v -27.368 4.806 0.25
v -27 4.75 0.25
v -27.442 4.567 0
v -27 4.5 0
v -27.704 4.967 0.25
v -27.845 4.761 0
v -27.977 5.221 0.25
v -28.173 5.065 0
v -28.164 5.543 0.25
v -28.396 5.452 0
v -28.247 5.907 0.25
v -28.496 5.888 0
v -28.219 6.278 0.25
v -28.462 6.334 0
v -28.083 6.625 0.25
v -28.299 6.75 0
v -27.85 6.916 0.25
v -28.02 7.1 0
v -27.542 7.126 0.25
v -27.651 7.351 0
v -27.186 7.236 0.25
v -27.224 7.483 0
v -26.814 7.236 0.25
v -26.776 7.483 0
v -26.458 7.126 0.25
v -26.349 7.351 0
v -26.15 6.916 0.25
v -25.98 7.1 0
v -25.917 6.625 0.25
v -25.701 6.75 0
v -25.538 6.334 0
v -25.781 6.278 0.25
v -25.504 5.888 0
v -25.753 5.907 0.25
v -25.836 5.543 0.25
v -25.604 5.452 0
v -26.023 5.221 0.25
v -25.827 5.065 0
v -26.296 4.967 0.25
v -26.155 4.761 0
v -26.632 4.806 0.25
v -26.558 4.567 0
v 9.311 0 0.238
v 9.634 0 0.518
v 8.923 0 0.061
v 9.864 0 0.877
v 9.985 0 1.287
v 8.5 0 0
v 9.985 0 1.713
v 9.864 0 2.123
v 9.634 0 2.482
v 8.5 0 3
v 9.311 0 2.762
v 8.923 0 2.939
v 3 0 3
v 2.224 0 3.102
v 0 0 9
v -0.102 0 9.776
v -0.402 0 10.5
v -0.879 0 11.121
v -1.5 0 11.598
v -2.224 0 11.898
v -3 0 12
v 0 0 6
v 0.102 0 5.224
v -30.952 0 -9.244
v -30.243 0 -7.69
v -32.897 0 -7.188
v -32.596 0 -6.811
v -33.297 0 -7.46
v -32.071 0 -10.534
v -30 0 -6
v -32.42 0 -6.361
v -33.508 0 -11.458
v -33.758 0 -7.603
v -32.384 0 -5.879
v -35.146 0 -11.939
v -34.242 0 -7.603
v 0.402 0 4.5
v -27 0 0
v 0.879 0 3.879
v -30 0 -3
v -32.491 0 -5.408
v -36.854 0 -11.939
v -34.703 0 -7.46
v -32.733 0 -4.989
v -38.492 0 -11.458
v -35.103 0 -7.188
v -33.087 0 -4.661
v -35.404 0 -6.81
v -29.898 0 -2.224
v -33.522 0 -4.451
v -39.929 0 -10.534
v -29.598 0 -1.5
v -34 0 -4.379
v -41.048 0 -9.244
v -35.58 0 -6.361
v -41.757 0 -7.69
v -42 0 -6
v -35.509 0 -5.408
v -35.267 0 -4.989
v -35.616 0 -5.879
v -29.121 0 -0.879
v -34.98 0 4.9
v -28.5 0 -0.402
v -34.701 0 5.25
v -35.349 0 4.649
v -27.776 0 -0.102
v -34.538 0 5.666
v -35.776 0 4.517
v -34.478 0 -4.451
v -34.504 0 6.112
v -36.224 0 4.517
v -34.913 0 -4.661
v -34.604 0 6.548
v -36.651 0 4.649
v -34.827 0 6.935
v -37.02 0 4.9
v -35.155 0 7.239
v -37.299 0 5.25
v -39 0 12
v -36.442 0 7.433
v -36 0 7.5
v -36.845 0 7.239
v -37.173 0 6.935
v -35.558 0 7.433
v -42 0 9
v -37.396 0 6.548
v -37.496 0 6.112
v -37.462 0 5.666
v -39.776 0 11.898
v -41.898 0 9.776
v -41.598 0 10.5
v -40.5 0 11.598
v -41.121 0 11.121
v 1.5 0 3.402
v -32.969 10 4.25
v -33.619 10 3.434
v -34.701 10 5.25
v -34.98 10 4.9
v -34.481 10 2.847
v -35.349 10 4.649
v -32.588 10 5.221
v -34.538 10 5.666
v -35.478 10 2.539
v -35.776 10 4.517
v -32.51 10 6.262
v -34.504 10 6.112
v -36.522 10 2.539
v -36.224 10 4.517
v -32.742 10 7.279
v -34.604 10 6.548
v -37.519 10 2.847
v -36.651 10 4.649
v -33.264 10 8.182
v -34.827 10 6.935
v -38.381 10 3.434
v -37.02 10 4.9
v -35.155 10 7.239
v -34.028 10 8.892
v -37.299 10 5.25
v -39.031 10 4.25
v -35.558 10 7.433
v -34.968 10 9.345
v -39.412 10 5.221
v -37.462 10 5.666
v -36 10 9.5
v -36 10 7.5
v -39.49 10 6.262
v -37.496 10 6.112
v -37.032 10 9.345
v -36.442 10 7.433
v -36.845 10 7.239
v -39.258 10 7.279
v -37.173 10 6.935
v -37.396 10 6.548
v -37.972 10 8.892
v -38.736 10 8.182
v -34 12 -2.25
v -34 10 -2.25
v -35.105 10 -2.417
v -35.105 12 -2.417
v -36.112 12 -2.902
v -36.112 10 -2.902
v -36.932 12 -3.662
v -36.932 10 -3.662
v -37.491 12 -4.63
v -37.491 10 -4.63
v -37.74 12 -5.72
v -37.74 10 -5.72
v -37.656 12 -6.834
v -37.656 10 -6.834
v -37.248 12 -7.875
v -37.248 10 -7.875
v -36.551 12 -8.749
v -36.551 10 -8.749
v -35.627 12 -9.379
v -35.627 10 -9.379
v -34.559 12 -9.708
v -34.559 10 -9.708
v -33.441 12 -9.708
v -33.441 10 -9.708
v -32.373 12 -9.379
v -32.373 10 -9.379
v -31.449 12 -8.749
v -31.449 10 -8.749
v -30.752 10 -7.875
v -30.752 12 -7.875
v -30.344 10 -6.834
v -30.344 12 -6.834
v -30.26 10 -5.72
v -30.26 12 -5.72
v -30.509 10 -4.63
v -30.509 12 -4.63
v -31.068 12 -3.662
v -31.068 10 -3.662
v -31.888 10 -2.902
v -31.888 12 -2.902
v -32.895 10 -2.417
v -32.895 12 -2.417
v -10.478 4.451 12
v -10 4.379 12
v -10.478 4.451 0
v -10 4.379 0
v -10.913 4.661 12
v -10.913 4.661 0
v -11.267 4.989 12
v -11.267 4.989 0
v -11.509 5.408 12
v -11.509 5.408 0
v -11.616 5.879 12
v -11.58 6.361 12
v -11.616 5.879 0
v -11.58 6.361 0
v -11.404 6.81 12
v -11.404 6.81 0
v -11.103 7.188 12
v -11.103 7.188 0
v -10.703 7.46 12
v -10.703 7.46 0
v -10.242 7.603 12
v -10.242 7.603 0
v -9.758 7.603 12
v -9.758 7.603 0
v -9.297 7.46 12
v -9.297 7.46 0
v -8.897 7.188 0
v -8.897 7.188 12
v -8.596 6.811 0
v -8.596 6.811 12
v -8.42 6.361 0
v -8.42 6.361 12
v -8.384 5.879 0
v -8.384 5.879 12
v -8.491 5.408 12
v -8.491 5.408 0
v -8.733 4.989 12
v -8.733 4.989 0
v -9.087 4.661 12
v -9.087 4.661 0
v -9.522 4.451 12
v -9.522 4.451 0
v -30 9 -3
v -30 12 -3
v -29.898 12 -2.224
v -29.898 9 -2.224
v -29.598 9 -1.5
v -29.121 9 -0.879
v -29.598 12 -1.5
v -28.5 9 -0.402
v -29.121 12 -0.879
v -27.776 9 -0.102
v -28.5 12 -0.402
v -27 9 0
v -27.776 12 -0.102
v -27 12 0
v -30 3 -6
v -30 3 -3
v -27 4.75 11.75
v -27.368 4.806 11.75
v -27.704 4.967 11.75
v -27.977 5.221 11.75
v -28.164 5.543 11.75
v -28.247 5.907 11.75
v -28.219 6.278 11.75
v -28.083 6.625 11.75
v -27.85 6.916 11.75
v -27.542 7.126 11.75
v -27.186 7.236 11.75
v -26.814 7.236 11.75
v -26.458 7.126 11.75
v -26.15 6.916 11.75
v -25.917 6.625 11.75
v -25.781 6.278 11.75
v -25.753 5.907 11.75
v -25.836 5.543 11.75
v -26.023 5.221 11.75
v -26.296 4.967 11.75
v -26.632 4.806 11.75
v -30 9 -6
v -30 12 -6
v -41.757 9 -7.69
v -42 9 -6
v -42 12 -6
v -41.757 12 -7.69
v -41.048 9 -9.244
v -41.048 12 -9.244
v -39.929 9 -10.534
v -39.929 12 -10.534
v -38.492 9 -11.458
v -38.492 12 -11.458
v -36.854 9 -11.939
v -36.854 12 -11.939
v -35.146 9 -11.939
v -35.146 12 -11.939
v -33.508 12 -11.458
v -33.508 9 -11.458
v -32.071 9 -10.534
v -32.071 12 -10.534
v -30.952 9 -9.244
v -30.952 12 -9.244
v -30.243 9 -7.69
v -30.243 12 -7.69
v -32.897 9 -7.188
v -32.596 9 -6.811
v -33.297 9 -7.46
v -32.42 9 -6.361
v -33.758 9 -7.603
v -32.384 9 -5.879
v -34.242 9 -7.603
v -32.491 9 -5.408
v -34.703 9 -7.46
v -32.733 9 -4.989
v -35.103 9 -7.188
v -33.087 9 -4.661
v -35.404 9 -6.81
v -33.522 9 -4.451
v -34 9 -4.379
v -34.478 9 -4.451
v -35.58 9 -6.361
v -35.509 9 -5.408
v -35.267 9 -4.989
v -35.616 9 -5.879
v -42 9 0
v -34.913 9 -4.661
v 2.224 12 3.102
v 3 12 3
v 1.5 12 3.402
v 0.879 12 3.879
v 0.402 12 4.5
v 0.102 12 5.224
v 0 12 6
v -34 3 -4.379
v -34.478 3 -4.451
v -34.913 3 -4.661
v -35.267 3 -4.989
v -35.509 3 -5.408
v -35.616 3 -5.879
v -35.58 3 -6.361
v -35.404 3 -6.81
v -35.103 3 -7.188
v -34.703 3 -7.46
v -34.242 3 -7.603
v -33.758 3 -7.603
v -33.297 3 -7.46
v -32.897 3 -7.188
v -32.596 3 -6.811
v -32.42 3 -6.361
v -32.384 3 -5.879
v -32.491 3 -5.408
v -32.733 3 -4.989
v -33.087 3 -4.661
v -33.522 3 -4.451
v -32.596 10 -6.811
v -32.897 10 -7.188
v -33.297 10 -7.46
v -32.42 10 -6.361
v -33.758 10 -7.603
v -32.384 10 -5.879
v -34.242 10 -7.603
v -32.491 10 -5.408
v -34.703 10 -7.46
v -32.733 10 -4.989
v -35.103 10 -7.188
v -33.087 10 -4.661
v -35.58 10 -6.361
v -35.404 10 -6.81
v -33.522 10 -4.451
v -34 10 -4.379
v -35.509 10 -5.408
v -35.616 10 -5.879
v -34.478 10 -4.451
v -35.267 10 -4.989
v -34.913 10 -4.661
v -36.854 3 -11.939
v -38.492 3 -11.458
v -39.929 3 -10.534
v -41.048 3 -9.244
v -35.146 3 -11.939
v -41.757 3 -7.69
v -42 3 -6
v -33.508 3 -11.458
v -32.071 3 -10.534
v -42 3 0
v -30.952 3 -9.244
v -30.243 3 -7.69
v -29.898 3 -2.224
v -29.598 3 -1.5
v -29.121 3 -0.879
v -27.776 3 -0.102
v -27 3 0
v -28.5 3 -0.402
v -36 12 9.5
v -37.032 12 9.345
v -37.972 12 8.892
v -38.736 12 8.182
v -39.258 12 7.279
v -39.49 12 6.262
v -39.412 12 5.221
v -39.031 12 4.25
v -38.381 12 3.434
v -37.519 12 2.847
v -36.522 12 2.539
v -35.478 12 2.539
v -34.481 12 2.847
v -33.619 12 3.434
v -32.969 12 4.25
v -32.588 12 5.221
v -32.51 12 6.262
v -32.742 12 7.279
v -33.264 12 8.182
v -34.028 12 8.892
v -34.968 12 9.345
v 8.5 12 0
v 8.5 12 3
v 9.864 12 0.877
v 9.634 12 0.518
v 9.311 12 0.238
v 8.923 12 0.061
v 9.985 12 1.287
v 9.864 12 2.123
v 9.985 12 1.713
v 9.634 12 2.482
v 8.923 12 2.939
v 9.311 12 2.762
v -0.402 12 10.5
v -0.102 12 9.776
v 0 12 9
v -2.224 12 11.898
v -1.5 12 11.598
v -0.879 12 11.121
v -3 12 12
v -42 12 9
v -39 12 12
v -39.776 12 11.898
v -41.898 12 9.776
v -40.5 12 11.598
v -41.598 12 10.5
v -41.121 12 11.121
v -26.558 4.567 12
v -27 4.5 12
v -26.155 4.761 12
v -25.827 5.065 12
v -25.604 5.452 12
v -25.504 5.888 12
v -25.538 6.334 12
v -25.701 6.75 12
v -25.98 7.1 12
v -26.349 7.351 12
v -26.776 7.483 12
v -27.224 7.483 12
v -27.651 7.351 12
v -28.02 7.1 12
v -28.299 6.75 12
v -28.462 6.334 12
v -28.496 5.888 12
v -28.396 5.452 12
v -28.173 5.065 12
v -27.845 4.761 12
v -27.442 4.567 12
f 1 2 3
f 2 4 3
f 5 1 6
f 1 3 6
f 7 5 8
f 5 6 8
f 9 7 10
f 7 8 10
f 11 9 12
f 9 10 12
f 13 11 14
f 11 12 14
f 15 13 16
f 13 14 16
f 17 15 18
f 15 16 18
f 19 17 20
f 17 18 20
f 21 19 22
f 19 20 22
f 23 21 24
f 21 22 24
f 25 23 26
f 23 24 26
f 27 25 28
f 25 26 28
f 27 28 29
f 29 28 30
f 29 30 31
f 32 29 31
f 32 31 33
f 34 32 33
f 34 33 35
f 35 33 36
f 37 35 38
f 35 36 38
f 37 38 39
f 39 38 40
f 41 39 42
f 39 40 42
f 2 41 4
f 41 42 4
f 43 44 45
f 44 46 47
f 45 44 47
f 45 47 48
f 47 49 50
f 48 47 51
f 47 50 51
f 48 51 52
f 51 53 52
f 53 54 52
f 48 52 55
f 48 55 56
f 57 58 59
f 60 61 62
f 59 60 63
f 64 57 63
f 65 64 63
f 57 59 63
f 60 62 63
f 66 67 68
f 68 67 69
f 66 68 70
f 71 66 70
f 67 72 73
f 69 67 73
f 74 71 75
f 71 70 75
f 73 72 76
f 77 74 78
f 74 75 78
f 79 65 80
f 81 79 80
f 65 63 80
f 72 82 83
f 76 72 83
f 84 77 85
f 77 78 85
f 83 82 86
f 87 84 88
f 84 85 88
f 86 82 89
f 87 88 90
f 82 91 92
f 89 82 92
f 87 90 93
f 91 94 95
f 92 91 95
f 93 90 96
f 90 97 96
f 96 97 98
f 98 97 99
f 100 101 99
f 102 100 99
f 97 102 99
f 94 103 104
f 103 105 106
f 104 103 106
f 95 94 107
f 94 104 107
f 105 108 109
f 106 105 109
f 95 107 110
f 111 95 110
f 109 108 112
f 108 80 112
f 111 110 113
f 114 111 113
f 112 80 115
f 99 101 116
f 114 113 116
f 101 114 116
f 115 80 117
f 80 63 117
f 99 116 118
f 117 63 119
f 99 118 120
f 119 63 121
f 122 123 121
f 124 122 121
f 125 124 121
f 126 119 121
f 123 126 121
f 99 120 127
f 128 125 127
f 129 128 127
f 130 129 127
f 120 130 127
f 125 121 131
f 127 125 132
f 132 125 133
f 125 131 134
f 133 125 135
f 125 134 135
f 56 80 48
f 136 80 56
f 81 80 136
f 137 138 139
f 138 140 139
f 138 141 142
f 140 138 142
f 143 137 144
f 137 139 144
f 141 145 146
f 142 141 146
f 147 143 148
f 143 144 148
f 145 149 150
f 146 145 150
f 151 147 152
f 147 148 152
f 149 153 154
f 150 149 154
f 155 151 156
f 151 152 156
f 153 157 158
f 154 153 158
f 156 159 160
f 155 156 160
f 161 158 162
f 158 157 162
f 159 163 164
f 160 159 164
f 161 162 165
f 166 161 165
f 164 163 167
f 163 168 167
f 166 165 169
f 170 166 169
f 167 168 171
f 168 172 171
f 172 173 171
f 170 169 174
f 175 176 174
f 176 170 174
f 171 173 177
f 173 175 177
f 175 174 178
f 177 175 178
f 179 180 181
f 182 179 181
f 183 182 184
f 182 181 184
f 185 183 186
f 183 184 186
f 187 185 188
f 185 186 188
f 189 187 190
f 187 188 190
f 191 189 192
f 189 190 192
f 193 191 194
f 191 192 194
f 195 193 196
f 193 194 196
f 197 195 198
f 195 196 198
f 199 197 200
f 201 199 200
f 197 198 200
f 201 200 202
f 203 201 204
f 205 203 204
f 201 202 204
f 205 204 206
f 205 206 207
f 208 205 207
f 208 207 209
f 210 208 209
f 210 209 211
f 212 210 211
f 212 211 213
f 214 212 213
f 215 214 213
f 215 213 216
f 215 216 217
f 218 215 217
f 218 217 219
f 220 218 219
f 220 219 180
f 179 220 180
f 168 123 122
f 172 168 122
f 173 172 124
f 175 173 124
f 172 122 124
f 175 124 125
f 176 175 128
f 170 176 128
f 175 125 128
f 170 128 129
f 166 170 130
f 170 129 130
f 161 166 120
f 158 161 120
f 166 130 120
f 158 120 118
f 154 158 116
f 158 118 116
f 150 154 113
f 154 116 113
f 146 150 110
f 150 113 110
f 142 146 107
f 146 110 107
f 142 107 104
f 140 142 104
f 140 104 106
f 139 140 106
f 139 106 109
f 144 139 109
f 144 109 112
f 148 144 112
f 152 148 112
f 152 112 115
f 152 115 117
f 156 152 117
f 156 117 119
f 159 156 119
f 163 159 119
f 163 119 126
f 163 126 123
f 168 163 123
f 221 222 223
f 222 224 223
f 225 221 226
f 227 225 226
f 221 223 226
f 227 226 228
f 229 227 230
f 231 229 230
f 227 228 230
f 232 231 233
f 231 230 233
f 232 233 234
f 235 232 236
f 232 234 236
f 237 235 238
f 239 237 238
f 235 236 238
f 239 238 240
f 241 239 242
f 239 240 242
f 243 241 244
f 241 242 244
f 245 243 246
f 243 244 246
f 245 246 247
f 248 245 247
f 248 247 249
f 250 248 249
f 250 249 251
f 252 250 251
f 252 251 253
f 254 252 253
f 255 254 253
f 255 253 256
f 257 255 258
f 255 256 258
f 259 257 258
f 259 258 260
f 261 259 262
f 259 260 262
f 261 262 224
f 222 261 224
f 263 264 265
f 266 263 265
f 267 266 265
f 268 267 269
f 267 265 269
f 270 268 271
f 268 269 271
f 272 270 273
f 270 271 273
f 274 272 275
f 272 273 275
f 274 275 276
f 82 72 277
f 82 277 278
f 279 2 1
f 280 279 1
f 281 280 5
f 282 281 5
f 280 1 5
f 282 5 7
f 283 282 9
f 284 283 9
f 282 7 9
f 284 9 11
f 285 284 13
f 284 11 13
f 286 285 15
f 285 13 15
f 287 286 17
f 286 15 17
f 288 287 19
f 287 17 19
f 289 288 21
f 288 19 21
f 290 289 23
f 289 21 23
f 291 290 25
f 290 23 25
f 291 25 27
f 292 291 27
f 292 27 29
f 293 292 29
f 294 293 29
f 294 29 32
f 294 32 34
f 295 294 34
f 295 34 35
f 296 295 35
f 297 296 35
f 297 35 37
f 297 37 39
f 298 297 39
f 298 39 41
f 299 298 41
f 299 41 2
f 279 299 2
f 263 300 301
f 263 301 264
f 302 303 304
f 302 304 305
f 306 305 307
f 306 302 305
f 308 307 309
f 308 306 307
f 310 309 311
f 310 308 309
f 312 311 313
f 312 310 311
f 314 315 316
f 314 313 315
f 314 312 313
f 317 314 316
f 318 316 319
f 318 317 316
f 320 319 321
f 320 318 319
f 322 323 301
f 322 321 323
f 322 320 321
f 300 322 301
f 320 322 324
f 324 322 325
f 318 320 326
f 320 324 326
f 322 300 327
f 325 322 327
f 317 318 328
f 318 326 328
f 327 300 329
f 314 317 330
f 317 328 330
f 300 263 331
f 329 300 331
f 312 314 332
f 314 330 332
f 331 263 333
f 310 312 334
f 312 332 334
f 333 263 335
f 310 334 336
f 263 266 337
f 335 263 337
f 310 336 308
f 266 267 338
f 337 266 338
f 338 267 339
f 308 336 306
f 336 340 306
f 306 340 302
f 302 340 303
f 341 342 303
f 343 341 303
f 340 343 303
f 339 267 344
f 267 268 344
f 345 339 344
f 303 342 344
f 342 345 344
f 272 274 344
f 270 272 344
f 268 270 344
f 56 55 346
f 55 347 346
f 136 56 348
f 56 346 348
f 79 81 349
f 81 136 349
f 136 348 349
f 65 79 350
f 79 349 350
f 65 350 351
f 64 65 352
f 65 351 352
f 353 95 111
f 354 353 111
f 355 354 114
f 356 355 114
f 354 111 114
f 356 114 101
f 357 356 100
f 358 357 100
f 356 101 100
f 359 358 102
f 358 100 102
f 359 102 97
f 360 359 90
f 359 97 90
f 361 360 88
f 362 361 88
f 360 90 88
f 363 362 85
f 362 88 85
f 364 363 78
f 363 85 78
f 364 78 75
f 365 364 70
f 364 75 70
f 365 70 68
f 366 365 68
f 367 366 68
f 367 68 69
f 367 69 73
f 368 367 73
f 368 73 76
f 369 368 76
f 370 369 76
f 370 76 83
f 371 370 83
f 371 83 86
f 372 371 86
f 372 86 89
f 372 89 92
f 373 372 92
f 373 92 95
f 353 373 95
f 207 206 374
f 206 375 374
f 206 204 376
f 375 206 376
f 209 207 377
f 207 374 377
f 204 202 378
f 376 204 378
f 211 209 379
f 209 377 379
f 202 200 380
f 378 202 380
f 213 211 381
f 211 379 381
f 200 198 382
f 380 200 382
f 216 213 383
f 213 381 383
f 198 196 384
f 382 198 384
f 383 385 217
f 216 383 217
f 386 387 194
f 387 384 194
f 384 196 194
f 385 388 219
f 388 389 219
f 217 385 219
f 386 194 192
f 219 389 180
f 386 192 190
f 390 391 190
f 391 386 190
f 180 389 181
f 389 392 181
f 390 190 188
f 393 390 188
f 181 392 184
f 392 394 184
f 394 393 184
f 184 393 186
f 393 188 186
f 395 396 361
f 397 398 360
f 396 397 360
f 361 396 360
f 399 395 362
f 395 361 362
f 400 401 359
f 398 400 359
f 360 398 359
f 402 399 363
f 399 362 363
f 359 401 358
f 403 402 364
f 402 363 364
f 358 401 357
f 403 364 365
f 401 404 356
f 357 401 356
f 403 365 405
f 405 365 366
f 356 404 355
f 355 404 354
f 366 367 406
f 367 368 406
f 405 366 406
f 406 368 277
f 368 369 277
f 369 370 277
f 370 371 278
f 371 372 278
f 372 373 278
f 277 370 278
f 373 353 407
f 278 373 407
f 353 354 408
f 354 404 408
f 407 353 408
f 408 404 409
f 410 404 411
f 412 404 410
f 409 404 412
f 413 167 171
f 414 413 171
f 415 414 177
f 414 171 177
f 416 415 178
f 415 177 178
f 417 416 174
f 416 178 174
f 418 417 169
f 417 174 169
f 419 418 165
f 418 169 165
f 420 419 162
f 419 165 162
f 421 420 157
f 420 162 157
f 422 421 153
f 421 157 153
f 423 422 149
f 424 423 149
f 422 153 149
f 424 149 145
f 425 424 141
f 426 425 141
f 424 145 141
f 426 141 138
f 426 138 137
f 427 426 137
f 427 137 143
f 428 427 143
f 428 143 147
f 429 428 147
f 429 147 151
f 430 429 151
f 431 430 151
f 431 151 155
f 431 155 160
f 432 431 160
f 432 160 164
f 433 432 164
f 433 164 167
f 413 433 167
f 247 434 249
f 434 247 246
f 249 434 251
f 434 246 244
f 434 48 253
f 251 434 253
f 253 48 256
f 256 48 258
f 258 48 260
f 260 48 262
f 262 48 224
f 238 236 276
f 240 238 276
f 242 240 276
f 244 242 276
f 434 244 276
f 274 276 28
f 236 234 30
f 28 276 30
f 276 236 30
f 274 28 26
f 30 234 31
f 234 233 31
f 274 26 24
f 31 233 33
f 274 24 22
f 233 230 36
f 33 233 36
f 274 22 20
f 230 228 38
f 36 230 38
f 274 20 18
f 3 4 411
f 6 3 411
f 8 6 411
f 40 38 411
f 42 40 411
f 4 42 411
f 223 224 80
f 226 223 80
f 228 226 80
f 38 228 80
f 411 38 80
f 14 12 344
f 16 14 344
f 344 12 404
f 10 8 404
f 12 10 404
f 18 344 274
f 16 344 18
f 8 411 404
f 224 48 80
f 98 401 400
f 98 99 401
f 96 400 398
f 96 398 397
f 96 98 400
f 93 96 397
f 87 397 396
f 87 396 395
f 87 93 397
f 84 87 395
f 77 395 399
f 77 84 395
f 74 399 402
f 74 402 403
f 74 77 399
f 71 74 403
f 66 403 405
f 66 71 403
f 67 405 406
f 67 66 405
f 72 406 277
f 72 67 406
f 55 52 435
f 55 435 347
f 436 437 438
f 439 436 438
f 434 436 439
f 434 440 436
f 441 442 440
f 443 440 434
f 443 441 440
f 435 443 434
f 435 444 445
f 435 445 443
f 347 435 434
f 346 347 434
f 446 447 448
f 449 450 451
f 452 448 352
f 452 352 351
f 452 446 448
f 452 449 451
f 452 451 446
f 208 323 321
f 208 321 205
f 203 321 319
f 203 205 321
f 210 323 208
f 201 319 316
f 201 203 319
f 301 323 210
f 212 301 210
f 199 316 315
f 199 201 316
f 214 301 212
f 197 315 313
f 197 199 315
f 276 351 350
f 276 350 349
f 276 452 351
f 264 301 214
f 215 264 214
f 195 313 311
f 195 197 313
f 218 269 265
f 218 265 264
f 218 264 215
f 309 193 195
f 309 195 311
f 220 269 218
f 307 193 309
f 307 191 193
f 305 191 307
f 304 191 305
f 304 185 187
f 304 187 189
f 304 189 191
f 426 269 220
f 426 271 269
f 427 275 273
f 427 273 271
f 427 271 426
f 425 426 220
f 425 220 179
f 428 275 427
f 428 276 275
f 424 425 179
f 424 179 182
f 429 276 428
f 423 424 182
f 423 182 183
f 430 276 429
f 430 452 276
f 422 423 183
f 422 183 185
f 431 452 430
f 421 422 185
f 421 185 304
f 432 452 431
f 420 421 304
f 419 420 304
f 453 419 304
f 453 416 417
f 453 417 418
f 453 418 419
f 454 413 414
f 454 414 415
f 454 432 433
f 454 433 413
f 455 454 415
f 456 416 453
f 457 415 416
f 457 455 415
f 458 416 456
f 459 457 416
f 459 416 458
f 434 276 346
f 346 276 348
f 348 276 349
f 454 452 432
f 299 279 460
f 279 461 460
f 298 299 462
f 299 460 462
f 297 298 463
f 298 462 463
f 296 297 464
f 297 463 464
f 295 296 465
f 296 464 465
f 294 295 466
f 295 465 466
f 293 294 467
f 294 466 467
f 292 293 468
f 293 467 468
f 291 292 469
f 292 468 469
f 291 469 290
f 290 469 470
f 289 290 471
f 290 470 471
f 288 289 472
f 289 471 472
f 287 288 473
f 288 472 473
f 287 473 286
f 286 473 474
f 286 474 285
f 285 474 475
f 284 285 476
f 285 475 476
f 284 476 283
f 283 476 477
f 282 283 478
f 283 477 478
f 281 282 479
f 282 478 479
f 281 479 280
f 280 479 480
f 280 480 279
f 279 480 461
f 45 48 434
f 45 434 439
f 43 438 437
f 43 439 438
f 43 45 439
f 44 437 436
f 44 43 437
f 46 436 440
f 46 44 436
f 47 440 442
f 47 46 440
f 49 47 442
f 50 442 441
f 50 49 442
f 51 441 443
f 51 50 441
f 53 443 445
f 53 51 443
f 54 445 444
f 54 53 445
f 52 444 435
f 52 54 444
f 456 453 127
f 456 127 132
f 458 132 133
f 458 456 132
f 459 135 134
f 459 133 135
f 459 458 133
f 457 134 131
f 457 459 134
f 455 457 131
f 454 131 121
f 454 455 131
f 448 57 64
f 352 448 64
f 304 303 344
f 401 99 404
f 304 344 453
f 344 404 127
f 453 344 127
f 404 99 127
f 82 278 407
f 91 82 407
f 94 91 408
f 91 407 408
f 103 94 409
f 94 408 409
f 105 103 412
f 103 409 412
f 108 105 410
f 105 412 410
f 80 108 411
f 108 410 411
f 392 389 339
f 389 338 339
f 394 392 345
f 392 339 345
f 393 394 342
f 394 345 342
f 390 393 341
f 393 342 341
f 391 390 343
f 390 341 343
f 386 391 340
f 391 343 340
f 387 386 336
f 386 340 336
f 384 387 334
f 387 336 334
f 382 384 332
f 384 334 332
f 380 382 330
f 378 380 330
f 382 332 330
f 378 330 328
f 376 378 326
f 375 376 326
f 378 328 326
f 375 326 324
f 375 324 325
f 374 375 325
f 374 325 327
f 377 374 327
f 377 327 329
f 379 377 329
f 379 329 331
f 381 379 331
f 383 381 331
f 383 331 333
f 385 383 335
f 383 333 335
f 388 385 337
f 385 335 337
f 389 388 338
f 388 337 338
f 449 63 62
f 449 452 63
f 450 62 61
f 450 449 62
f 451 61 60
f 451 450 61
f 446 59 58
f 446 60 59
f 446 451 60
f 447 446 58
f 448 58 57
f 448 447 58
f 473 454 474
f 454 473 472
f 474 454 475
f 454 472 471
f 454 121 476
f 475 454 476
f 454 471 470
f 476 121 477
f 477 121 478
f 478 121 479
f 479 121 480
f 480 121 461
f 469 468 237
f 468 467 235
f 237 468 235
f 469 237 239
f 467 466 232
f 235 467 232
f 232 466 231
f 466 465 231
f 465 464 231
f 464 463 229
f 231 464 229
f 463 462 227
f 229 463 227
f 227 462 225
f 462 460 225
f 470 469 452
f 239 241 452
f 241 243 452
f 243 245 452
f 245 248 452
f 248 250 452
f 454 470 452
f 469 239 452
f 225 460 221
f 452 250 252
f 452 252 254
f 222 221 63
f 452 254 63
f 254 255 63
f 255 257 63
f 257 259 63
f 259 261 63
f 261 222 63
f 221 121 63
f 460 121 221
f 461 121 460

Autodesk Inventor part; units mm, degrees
ref_plane "YZ Plane" through (0, 0, 0) normal (1, 0, 0) x (0, 1, 0)
ref_plane "XZ Plane" through (0, 0, 0) normal (0, 1, 0) x (-1, 0, 0)
ref_plane "XY Plane" through (0, 0, 0) normal (0, 0, 1) x (1, 0, 0)
sketch "草圖1" plane through (0, 0, 0) normal (0, 1, 0) x (-1, 0, 0)
  line L0 (0, 0) -> (42, 0)
  line L1 (42, 0) -> (42, 12)
  line L2 (42, 12) -> (0, 12)
  line L3 (0, 12) -> (0, 0)
  line L4 (0, 0) -> (-8.5, 0)
  line L5 (-10, 1.5) -> (-10, 1.5)
  line L6 (-8.5, 3) -> (0, 3)
  line L7 (0, 3) -> (0, 0)
  line L8 (30, 0) -> (42, 0)
  line L9 (42, 0) -> (42, -6)
  line L10 (36, -12) -> (36, -12)
  line L11 (30, -6) -> (30, 0)
  arc A0 (30, -6) -> (36, -12) centre (36, -6) ccw
  arc A1 (36, -12) -> (42, -6) centre (36, -6) ccw
  arc A2 (-8.5, 3) -> (-10, 1.5) centre (-8.5, 1.5) ccw
  arc A3 (-10, 1.5) -> (-8.5, 0) centre (-8.5, 1.5) ccw
  point P0 (-10, 3)
  point P1 (-10, 0)
  point P2 (42, -12)
  point P3 (30, -12)
  dimension "d0" = 42
  dimension "d2" = 10
  dimension "d3" = 3
  dimension "d4" = 12
  dimension "d6" = 12
  dimension "d7" = 12
  dimension "d8" = 6
  dimension "d9" = 1.5
extrude "擠出1" add sketch "草圖1" along normal blind 12
fillet "圓角1" radius 3 4 edges at (-42, 6, 12) (-30, 6, 0) (0, 6, 3) (0, 6, 12)
sketch "草圖2" plane through (0, 12, 0) normal (0, 1, 0) x (1, 0, 0)
  line L0 (-42, 6) -> (-42, -9) projected
  line L1 (-39, -12) -> (-3, -12) projected
  point P0 (0, 0)
  point P1 (-36, -6)
  dimension "d13" = 6
  dimension "d14" = 6
hole "孔1" at (-36, 12, 6) direction (0, -1, 0) diameter 3 end through all counterbore diameter 7 counterbore depth 2
sketch "草圖3" plane through (8.5, 0, 0) normal (0, 0, -1) x (-1, 0, 0)
  line L0 (35.5, 12) -> (35.5, 0) projected
  line L1 (0, 0) -> (35.5, 0) projected
  line L2 (35.5, 9) -> (50.5, 9)
  line L3 (50.5, 9) -> (50.5, 3)
  line L4 (50.5, 3) -> (35.5, 3)
  line L5 (35.5, 3) -> (35.5, 9)
  point P0 (8.5, 0)
  dimension "d22" = 6
  dimension "d24" = 15
  dimension "d25" = 3
extrude "擠出2" cut sketch "草圖3" along normal blind 12
sketch "草圖4" plane through (0, 12, 0) normal (0, 1, 0) x (1, 0, 0)
  line L0 (-30, 3) -> (-30, 6) projected
  point P0 (0, 0)
  point P1 (-34, 6)
  dimension "d28" = 4
hole "孔2" at (-34, 12, -6) direction (0, -1, 0) diameter 3.242 end through all counterbore diameter 7.5 counterbore depth 2 thread size "M4x0.7" class "6H" standard "ANSI Metric M Profile"
sketch "草圖5" plane through (-39, 0, 12) normal (0, 0, 1) x (1, 0, 0)
  line L0 (-3, 12) -> (-3, 0) projected
  point P0 (39, 0)
  point P1 (12, 6)
  dimension "d36" = 15
hole "孔3" at (-27, 6, 12) direction (0, 0, -1) diameter 2.5 end through all
chamfer "倒角1" distance 0.25 angle 45 2 edges at (-27, 7.25, 12) (-27, 7.25, 0)
sketch "草圖6" plane through (-39, 0, 12) normal (0, 0, 1) x (1, 0, 0)
  line L0 (-3, 12) -> (-3, 0) projected
  point P0 (39, 0)
  point P1 (29, 6)
  dimension "d47" = 32
hole "孔4" at (-10, 6, 12) direction (0, 0, -1) diameter 3.242 end through all thread size "M4x0.7" class "6H" standard "ANSI Metric M Profile"
properties part number "extruder_lever"
